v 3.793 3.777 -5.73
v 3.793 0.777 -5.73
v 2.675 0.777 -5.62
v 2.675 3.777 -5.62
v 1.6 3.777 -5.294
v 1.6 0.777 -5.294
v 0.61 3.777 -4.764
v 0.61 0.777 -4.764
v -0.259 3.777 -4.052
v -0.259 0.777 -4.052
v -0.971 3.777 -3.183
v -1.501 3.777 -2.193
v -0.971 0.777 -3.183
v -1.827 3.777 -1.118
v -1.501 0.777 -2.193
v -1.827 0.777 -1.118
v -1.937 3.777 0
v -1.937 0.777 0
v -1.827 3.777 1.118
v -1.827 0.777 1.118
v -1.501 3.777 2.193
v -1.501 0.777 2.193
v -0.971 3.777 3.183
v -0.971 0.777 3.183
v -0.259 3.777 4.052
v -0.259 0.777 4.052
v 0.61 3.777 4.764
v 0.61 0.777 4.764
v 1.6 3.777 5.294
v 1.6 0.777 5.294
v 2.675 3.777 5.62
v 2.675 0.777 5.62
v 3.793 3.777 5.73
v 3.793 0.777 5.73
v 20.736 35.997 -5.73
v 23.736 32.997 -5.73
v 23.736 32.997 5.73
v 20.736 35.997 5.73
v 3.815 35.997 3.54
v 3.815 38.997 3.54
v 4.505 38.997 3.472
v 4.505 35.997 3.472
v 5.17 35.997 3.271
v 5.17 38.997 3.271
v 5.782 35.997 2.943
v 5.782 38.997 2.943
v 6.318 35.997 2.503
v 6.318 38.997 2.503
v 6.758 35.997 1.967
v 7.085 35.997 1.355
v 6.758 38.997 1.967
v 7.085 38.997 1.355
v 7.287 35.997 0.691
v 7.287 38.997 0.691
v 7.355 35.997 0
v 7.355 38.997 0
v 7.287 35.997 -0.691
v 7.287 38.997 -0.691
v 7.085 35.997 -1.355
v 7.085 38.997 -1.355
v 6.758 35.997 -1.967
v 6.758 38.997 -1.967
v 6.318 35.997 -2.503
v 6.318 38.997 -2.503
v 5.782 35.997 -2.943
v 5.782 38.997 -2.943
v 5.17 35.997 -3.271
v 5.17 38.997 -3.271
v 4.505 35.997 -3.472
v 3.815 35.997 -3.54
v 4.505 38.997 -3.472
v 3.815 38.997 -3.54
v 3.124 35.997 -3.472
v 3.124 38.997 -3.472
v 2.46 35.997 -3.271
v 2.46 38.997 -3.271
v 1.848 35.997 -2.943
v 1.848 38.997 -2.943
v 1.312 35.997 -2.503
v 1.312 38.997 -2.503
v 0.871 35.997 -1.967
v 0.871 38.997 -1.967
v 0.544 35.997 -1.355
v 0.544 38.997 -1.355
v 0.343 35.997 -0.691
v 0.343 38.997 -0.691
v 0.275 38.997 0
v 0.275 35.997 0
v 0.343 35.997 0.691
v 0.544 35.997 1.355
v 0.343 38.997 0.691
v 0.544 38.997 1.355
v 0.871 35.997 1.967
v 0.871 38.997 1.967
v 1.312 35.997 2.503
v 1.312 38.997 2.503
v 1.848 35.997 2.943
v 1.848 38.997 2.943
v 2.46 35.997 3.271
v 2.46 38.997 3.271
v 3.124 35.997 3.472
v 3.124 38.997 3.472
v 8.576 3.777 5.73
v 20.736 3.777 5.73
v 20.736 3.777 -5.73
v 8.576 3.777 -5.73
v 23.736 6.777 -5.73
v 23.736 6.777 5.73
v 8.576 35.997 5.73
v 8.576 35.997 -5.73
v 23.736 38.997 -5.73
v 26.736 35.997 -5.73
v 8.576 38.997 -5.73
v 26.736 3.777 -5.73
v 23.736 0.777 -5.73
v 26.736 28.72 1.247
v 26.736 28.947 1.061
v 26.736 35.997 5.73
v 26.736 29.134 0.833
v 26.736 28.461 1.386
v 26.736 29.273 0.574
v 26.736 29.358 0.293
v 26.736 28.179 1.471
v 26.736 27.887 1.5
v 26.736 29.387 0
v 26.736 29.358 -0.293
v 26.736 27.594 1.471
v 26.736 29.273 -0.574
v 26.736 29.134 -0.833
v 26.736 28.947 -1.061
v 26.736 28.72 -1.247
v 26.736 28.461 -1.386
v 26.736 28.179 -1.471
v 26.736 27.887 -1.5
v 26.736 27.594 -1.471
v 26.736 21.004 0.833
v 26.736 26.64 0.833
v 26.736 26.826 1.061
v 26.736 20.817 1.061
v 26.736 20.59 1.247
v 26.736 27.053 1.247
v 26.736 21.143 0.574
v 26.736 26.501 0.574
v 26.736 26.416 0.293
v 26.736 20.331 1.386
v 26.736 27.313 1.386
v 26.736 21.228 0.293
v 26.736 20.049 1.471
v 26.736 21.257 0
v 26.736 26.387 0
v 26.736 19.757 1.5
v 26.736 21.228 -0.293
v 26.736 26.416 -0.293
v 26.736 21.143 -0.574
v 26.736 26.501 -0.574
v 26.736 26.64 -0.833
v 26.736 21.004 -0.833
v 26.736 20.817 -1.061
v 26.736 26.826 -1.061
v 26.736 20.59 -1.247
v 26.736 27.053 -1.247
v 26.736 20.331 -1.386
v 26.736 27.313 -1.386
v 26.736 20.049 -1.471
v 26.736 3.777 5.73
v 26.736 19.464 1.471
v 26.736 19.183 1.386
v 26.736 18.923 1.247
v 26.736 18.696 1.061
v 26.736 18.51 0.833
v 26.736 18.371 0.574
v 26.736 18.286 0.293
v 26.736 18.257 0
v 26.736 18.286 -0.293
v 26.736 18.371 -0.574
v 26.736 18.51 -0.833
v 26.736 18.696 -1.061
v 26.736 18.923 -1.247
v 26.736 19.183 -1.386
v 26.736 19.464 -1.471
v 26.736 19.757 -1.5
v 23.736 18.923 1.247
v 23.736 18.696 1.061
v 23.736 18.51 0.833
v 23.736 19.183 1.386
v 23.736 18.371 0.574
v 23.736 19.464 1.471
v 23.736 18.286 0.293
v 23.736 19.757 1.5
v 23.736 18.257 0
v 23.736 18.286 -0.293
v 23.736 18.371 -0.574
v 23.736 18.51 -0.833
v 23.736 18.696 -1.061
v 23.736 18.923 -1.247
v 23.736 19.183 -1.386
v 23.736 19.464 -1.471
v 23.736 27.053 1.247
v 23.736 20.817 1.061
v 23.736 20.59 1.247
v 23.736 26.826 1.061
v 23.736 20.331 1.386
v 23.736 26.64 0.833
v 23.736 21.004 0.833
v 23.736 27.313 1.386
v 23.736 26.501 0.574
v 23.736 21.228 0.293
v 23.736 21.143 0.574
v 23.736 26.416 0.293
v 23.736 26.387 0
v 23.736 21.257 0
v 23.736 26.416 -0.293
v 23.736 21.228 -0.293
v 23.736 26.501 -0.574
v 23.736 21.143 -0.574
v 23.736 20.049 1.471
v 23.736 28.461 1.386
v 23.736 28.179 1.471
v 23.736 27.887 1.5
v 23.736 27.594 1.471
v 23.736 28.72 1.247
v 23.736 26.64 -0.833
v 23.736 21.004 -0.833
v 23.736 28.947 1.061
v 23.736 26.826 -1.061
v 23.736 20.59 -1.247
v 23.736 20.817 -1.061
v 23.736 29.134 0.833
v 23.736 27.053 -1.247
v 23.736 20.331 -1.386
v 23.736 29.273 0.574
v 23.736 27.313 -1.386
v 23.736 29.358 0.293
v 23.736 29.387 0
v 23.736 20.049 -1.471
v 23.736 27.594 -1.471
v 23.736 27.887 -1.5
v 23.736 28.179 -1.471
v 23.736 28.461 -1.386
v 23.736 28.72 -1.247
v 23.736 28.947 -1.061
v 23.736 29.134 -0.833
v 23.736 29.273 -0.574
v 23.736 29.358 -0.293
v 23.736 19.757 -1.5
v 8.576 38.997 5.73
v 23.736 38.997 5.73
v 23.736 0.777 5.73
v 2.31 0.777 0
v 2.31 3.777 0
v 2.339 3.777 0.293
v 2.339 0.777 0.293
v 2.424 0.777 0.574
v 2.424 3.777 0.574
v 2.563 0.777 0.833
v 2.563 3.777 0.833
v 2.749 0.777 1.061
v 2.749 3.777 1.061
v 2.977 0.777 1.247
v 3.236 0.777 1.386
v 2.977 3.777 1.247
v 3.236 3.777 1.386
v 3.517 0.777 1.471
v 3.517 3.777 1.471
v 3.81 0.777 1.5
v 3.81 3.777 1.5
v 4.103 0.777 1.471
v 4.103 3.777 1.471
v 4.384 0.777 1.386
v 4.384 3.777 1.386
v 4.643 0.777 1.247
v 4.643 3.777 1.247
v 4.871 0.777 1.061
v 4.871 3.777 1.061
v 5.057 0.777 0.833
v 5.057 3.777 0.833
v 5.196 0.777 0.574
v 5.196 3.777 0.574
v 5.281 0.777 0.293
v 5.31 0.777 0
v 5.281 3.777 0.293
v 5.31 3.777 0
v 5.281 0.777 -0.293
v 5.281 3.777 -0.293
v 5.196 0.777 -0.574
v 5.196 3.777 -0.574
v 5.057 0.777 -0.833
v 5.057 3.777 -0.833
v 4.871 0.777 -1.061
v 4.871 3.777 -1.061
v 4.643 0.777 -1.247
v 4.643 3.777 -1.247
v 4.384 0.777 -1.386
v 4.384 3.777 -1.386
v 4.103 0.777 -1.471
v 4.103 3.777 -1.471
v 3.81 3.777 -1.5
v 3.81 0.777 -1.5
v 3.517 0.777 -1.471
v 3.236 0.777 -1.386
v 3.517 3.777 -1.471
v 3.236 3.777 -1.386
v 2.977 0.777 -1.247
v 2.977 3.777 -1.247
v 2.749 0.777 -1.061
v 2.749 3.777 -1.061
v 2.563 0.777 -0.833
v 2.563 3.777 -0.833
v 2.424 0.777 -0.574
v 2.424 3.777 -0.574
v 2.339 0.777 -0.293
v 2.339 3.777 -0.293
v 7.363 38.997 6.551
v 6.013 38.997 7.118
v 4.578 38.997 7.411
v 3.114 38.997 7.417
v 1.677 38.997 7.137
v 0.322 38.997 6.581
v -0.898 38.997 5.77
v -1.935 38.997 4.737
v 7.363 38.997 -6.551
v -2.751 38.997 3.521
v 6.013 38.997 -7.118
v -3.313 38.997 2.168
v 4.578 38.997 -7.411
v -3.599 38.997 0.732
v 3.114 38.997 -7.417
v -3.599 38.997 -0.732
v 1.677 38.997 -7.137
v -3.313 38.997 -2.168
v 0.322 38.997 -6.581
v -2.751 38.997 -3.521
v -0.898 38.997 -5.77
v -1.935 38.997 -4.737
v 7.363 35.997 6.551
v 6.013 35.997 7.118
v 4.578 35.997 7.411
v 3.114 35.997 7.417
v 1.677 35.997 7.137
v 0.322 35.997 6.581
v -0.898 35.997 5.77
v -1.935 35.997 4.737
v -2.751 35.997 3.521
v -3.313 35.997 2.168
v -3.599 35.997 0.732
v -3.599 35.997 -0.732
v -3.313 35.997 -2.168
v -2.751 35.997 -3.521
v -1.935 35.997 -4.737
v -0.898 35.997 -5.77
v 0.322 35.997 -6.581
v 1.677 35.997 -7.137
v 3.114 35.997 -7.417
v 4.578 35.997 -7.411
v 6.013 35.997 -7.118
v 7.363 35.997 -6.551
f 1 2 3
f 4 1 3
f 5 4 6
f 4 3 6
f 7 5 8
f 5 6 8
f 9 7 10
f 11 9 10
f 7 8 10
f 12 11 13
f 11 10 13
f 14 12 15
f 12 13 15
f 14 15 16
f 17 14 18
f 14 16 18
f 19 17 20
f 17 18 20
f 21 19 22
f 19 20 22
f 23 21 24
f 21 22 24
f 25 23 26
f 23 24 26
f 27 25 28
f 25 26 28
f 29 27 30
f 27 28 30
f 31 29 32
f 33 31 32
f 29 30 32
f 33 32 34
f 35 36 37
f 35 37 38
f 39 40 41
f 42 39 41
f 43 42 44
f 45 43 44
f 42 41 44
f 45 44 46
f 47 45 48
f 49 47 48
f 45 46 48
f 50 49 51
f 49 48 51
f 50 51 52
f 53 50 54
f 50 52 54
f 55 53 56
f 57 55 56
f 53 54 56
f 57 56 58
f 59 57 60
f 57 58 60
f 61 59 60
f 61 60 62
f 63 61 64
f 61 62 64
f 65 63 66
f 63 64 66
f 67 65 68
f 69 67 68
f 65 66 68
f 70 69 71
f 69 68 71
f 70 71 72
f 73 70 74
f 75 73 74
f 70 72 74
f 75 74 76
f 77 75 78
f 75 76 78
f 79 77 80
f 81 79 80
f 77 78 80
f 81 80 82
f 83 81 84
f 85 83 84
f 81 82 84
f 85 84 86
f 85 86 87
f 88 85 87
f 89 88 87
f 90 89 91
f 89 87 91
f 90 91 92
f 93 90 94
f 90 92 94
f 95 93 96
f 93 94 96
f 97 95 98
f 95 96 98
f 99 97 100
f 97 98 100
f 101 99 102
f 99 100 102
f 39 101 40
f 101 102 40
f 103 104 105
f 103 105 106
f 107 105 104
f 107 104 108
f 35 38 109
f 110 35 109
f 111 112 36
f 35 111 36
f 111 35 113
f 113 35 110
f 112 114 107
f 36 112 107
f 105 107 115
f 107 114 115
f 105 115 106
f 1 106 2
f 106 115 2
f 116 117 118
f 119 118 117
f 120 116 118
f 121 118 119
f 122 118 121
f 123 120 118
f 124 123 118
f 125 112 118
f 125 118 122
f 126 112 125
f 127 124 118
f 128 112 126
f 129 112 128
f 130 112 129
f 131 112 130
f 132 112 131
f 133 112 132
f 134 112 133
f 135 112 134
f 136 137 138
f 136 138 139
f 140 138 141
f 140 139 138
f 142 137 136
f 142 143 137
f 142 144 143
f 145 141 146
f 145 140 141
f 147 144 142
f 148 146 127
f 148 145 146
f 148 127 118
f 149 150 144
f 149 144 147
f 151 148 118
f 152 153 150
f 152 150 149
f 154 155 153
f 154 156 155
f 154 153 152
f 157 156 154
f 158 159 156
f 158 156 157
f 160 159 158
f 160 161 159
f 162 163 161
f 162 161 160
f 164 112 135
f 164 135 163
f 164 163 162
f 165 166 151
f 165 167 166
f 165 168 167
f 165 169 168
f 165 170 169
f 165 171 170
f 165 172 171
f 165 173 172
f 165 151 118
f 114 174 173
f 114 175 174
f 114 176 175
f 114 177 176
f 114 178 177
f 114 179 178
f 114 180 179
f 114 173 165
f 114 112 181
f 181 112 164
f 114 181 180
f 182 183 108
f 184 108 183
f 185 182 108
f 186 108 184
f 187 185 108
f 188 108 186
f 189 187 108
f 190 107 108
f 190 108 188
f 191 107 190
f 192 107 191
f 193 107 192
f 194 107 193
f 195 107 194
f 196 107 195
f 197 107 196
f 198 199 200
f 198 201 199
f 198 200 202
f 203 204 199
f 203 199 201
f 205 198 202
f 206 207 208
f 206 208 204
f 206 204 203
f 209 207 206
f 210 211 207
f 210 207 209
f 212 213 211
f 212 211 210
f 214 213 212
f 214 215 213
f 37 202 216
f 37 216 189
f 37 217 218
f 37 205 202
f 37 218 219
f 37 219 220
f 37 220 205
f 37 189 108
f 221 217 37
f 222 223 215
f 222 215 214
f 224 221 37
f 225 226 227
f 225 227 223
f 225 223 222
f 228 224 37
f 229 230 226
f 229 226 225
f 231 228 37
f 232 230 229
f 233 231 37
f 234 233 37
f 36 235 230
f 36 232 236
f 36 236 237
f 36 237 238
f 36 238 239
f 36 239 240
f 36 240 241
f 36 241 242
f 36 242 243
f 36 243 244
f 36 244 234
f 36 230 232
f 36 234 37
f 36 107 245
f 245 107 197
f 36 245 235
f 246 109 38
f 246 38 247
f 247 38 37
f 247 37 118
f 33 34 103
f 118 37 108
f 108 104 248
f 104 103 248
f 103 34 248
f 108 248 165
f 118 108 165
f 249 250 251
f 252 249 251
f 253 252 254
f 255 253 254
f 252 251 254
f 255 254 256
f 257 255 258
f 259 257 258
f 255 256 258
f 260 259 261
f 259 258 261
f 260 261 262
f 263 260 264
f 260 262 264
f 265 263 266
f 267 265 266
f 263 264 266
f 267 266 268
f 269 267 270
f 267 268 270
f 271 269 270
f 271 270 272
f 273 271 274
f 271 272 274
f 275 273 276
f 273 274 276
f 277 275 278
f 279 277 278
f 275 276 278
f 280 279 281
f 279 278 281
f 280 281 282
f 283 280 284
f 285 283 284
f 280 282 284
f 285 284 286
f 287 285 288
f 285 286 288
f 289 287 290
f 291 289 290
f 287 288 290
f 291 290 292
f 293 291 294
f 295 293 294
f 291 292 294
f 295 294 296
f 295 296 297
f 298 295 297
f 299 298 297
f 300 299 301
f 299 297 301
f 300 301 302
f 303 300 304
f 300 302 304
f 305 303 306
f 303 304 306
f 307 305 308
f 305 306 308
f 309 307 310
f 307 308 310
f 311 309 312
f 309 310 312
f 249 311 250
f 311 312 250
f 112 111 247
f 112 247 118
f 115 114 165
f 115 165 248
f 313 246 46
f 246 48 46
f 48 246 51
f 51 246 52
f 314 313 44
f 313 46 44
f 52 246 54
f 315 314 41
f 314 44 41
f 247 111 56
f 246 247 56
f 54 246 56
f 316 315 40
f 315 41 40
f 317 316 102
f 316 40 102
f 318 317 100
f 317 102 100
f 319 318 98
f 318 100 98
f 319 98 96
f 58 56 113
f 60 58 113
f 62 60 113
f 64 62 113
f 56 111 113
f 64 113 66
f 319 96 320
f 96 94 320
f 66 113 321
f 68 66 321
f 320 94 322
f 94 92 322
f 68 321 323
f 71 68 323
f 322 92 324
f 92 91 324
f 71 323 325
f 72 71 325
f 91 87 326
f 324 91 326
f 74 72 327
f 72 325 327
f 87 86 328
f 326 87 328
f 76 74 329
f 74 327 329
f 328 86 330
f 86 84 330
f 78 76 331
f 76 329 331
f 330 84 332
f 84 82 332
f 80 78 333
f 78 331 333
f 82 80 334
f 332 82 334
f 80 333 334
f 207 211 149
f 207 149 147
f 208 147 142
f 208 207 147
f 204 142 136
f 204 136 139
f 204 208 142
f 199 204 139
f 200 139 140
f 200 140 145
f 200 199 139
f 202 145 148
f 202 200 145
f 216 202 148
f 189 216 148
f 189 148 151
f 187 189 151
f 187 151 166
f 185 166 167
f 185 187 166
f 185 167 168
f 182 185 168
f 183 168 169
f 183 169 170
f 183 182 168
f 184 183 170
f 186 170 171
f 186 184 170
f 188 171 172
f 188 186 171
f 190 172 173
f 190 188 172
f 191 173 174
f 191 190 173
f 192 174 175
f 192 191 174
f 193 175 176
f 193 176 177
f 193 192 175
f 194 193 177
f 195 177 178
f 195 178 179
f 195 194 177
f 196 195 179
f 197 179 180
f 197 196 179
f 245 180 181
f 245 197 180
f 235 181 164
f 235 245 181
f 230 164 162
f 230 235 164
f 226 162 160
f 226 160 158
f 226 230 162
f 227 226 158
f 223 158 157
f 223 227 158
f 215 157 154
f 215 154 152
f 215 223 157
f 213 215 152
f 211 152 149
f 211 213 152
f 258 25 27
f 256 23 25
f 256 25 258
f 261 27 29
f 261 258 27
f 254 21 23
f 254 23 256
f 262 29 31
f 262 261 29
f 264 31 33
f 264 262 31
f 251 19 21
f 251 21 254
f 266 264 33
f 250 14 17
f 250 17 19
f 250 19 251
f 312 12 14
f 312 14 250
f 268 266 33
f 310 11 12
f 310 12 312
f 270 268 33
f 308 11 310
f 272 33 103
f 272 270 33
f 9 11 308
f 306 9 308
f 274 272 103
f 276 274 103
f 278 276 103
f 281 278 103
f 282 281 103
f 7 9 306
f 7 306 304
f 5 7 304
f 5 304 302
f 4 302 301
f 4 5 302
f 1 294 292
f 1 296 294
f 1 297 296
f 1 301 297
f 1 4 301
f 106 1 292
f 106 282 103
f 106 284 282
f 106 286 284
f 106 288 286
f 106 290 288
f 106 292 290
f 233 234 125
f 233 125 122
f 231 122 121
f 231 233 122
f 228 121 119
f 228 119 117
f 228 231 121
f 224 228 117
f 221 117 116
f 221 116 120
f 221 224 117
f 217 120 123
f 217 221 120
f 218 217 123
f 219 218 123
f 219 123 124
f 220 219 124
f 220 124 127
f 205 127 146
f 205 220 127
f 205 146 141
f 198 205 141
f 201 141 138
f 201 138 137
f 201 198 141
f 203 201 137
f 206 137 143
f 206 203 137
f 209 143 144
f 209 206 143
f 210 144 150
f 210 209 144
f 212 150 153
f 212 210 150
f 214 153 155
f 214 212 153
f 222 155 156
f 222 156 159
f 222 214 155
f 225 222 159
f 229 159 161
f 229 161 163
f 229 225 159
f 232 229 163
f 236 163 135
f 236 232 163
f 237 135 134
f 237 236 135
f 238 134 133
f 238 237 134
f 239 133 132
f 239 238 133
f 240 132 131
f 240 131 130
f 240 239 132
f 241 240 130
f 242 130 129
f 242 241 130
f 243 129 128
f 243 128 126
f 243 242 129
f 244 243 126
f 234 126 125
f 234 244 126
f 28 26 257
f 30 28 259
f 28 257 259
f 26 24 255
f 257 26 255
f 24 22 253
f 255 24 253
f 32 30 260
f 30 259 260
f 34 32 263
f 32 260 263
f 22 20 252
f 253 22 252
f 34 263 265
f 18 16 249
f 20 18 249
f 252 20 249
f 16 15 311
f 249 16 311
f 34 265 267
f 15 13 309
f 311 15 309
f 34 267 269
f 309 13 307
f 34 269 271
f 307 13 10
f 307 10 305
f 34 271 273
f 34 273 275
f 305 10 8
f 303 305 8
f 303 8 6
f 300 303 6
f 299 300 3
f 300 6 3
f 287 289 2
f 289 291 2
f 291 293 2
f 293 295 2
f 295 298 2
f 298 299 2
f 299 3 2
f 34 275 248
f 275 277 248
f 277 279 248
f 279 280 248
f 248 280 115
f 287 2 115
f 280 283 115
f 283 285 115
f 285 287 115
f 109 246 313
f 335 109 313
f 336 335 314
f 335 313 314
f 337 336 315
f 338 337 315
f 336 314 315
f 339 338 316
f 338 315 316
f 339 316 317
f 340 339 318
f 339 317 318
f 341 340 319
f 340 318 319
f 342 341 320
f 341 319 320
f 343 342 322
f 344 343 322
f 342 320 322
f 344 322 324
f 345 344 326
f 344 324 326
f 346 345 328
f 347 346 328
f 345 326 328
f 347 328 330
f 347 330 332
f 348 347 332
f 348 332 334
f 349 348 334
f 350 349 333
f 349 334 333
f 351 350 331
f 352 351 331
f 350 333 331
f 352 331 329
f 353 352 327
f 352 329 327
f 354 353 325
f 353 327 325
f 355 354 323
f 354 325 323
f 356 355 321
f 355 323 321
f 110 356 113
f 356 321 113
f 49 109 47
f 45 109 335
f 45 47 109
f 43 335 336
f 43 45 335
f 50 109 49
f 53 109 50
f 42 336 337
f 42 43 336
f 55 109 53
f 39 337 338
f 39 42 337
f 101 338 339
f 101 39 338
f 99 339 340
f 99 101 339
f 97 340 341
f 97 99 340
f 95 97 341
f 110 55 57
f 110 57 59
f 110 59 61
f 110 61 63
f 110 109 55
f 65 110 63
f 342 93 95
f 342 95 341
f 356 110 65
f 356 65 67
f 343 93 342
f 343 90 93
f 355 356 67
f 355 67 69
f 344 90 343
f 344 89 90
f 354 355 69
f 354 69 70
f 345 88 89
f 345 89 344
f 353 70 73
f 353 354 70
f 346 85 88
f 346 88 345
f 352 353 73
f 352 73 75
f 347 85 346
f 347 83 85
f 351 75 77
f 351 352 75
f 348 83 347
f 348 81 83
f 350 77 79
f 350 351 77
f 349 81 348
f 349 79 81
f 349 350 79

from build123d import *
from OCP.BRepAlgoAPI import BRepAlgoAPI_Cut
from OCP.TopTools import TopTools_ListOfShape

# Parameters (mm, degrees)
BOSS_EXTRUDE1_DEPTH      = 5.73
BOSS_EXTRUDE1_DEPTH_BACK = 5.73
BOSS_EXTRUDE5_DEPTH      = 11.46
BOSS_EXTRUDE8_DEPTH      = 11.46
BOSS_EXTRUDE9_DEPTH      = 3
SKETCH11_R               = 3.54
CUT_EXTRUDE1_DEPTH       = 3
BOSS_EXTRUDE10_DEPTH     = 3
SKETCH13_R               = 1.5
CUT_EXTRUDE2_DEPTH       = 3
CUT_EXTRUDE3_START       = -3.000002
SKETCH15_R               = 1.5
CUT_EXTRUDE3_DEPTH       = 3.000002


with BuildPart() as part:
    # Sketch1 → Boss-Extrude1 (new, two sides: drawn at the far end of the back side and taken through both)
    with BuildSketch(Plane.XY.offset(-BOSS_EXTRUDE1_DEPTH_BACK)):
        Polygon((23.736099909, 38.996836219), (26.736100401, 35.996833865), (26.736100401, 3.776835326), (23.736098978, 0.776835766), (20.736098486, 3.77683812), (23.736098978, 6.776836749), (23.736098978, 32.99683803), (20.736100349, 35.996838521), align=None)
    extrude(amount=BOSS_EXTRUDE1_DEPTH + BOSS_EXTRUDE1_DEPTH_BACK)

    # Sketch6 → Boss-Extrude5 (add)
    with BuildSketch(Plane.XY.offset(5.73)):
        Polygon((20.736098486, 3.77683812), (8.576098486, 3.77683812), (8.576098486, 0.776835766), (20.736098486, 0.776835766), (23.736098978, 0.776835766), align=None)
    extrude(amount=-BOSS_EXTRUDE5_DEPTH)

    # Sketch8 → Boss-Extrude8 (add)
    with BuildSketch(Plane.XY.offset(5.73)):
        Polygon((20.736100349, 38.996836219), (23.736099909, 38.996836219), (20.736100349, 35.996838521), (8.576100349, 35.996838521), (8.576100349, 38.996836219), align=None)
    extrude(amount=-BOSS_EXTRUDE8_DEPTH)

    # Sketch9 → Boss-Extrude9 (add)
    with BuildSketch(Plane(origin=(0, 38.996836219, 0), x_dir=(1, 0, 0), z_dir=(0, 1, 0))):
        with BuildLine():
            Line((8.576100349, 5.73), (8.576100349, -5.73))
            ThreePointArc((8.576100349, -5.73), (-3.635159989, 0), (8.576100349, 5.73))
        make_face()
    extrude(amount=-BOSS_EXTRUDE9_DEPTH)

    # Sketch11 → Cut-Extrude1 (cut)
    with BuildSketch(Plane(origin=(0, 38.996836219, 0), x_dir=(1, 0, 0), z_dir=(0, 1, 0))):
        with Locations(Location((3.814840011, 0, 0), (0, 0, 270))):
            Circle(SKETCH11_R)
    extrude(amount=-CUT_EXTRUDE1_DEPTH, mode=Mode.SUBTRACT)

    # Sketch12 → Boss-Extrude10 (add)
    with BuildSketch(Plane(origin=(0, 0.776835766, 0), x_dir=(-1, 0, 0), z_dir=(0, -1, 0))):
        with BuildLine():
            Line((-8.576098486, 5.73), (-3.793078174, 5.73))
            ThreePointArc((-3.793078174, 5.73), (1.936921826, 0), (-3.793078174, -5.73))
            Line((-3.793078174, -5.73), (-8.576098486, -5.73))
            Line((-8.576098486, -5.73), (-8.576098486, 5.73))
        make_face()
    extrude(amount=-BOSS_EXTRUDE10_DEPTH)


with BuildPart() as cut_extrude2_tool:
    # Sketch13 → Cut-Extrude2 (new body)
    with BuildSketch(Plane(origin=(0, 3.77683812, 0), x_dir=(1, 0, 0), z_dir=(0, 1, 0))):
        with Locations(Location((3.81, 0, 0), (0, 0, 180))):
            Circle(SKETCH13_R)
    extrude(amount=-CUT_EXTRUDE2_DEPTH)


with BuildPart() as part_1:
    add(part.part)

    # Cut-Extrude2: cut by cut_extrude2_tool, with a tolerance
    cut_extrude2_stock = TopTools_ListOfShape()
    cut_extrude2_stock.Append(part_1.part.wrapped)
    cut_extrude2_tools = TopTools_ListOfShape()
    cut_extrude2_tools.Append(cut_extrude2_tool.part.wrapped)
    cut_extrude2_cut = BRepAlgoAPI_Cut()
    cut_extrude2_cut.SetArguments(cut_extrude2_stock)
    cut_extrude2_cut.SetTools(cut_extrude2_tools)
    cut_extrude2_cut.SetFuzzyValue(0.00001)
    cut_extrude2_cut.Build()
    add(Compound.cast(cut_extrude2_cut.Shape()).solids(), mode=Mode.REPLACE)

    # Sketch15 → Cut-Extrude3 (cut)
    with BuildSketch(Plane(origin=(26.736100401, 0, 0), x_dir=(0, 0, -1), z_dir=(1, 0, 0)).offset(CUT_EXTRUDE3_START)):
        with Locations(Location((0, 27.886833865, 0), (0, 0, 90))):
            Circle(SKETCH15_R)
        with Locations(Location((0, 19.756835766, 0), (0, 0, 90))):
            Circle(SKETCH15_R)
    extrude(amount=CUT_EXTRUDE3_DEPTH, mode=Mode.SUBTRACT)


solid = part_1.part
